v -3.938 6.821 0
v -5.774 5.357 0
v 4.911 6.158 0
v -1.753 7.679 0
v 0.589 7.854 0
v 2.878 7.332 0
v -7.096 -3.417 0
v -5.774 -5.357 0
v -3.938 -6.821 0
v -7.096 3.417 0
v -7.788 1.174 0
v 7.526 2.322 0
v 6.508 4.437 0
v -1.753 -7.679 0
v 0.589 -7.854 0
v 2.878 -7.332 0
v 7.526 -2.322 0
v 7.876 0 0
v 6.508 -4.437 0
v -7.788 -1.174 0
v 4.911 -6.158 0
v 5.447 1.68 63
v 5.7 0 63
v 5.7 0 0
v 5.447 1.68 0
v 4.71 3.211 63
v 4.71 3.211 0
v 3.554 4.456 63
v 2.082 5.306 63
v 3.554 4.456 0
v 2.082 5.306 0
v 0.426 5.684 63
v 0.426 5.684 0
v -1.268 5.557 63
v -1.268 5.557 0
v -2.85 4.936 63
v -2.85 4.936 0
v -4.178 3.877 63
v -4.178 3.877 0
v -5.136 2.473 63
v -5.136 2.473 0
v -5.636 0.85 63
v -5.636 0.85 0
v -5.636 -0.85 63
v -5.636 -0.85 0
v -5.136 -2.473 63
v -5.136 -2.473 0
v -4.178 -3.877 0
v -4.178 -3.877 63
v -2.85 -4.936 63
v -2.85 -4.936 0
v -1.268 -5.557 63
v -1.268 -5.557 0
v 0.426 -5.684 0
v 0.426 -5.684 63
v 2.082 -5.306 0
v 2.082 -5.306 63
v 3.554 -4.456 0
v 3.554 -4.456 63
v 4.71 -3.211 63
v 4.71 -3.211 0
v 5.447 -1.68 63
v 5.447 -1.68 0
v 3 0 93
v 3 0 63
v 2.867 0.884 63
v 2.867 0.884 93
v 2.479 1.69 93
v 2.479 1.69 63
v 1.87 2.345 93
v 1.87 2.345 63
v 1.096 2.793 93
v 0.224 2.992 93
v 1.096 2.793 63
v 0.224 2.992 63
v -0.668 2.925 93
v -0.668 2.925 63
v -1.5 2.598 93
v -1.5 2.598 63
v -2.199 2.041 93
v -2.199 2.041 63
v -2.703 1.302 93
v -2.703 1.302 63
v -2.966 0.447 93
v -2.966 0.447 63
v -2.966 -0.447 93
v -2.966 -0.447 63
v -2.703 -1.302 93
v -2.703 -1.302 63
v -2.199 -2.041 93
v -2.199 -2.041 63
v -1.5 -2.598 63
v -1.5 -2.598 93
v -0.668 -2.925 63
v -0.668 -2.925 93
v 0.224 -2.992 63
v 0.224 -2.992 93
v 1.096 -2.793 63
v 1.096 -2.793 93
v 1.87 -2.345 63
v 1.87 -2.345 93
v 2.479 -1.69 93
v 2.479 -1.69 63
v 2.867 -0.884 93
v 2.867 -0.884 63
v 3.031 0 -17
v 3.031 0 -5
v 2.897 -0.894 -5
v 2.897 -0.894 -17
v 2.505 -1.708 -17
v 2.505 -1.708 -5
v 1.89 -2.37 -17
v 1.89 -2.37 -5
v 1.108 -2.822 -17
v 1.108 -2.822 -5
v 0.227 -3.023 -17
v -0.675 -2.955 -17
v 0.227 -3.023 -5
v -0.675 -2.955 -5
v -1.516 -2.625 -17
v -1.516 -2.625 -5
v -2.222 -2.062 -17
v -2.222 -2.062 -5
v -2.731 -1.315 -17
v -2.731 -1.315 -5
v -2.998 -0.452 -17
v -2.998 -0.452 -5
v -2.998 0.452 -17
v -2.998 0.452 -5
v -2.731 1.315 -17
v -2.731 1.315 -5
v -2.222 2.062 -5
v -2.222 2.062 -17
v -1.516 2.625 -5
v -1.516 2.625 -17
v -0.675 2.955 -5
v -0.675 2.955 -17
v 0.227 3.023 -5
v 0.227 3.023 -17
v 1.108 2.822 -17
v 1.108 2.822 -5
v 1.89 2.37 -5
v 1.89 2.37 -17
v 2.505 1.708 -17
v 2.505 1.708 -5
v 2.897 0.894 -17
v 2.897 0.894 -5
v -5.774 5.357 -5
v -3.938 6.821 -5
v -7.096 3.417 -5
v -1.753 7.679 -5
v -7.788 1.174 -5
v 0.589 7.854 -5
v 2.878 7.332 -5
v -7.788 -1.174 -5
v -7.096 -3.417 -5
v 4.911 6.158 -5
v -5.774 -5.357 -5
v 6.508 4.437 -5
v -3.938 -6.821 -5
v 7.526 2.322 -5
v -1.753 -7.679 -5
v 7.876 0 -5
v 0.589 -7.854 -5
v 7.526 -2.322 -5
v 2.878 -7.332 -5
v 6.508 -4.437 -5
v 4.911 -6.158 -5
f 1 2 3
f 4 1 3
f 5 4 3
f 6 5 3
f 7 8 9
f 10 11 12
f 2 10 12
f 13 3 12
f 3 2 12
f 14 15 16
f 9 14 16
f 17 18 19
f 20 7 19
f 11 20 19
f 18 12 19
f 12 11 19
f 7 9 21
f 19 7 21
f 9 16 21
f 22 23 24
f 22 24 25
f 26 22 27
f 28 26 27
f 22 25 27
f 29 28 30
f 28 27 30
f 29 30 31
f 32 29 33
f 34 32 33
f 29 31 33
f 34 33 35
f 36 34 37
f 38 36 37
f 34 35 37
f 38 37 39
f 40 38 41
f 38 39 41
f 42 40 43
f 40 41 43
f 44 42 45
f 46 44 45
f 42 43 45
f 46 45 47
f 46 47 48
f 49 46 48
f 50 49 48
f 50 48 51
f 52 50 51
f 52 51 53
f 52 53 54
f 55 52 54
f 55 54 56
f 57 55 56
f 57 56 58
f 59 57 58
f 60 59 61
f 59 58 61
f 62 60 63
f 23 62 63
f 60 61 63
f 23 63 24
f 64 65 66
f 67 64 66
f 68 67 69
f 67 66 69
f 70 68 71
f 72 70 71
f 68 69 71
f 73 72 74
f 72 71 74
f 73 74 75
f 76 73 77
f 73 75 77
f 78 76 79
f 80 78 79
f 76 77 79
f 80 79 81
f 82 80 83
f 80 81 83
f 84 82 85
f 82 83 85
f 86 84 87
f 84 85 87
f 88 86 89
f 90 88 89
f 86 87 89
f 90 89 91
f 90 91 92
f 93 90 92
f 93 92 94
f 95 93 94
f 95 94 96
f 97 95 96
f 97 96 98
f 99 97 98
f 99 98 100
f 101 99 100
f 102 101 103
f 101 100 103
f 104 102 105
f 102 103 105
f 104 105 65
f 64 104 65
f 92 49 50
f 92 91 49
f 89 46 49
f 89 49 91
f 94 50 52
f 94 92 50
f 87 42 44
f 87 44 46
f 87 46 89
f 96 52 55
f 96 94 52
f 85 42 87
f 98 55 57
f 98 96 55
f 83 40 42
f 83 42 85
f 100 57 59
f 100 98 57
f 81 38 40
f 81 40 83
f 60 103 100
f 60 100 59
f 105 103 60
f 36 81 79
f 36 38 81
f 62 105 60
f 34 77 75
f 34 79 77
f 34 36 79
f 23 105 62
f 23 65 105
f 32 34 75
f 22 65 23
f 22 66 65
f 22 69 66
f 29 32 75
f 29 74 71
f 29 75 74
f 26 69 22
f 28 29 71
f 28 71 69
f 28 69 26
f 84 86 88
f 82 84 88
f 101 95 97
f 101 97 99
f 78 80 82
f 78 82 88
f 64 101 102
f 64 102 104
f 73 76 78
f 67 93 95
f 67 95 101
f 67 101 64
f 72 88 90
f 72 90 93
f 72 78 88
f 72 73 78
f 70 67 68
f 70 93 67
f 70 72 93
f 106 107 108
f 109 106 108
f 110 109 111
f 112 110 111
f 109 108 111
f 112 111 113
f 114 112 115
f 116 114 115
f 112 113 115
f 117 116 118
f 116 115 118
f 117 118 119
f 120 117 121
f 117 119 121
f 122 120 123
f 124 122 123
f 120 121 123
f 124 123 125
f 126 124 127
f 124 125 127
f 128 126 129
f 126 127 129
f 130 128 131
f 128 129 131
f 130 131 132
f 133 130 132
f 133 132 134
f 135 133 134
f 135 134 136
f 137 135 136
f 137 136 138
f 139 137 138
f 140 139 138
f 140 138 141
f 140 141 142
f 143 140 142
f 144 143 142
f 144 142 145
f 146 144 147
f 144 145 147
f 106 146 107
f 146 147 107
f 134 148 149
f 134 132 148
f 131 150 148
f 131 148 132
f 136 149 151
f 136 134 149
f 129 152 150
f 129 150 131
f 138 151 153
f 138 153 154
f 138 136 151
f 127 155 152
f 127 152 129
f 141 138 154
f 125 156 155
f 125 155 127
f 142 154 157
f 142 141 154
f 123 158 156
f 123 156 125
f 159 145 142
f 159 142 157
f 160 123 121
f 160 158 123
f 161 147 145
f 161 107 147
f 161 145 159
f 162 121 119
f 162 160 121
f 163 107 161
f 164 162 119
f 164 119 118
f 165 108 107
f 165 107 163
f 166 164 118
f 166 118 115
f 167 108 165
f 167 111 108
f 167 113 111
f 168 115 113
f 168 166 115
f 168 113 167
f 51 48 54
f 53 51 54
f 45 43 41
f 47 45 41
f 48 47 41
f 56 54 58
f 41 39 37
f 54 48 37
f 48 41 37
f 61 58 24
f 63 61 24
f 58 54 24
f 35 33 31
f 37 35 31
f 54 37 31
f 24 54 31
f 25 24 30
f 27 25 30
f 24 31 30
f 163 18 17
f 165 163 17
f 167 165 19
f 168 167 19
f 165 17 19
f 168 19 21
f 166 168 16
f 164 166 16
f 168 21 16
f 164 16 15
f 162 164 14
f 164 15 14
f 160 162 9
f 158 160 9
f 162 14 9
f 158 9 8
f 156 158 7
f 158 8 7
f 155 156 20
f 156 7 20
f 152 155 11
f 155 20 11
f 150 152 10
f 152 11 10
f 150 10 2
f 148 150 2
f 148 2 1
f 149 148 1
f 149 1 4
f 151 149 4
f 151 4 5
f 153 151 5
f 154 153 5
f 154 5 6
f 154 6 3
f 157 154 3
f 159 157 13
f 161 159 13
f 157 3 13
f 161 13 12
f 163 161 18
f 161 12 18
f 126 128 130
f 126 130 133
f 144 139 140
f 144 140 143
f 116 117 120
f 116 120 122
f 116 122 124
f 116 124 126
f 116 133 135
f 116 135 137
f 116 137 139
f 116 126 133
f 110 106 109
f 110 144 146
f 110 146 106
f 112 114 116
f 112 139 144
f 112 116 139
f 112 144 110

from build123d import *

# Parameters (mm, degrees)
F0_R     = 5.7
F1_DEPTH = 63
F2_R     = 3
F3_DEPTH = 30
F4_R     = 7.876213
F5_DEPTH = 5
F6_R     = 3.031445
F7_DEPTH = 12


with BuildPart() as f1:
    # F0 (on Top) → F1 (new body)
    with BuildSketch(Plane.XY):
        Circle(F0_R)
    extrude(amount=F1_DEPTH)

    # F2 (on face) → F3 (join)
    with BuildSketch(Plane.XY.offset(63)):
        Circle(F2_R)
    extrude(amount=F3_DEPTH)


with BuildPart() as f5:
    # F4 (on face) → F5 (new body)
    with BuildSketch(Plane(origin=(0, 0, 0), x_dir=(1, 0, 0), z_dir=(0, 0, -1))):
        Circle(F4_R)
    extrude(amount=F5_DEPTH)

    # F6 (on face) → F7 (join)
    with BuildSketch(Plane(origin=(0, 0, -5), x_dir=(1, 0, 0), z_dir=(0, 0, -1))):
        Circle(F6_R)
    extrude(amount=F7_DEPTH)


solid = Compound([f1.part, f5.part])
